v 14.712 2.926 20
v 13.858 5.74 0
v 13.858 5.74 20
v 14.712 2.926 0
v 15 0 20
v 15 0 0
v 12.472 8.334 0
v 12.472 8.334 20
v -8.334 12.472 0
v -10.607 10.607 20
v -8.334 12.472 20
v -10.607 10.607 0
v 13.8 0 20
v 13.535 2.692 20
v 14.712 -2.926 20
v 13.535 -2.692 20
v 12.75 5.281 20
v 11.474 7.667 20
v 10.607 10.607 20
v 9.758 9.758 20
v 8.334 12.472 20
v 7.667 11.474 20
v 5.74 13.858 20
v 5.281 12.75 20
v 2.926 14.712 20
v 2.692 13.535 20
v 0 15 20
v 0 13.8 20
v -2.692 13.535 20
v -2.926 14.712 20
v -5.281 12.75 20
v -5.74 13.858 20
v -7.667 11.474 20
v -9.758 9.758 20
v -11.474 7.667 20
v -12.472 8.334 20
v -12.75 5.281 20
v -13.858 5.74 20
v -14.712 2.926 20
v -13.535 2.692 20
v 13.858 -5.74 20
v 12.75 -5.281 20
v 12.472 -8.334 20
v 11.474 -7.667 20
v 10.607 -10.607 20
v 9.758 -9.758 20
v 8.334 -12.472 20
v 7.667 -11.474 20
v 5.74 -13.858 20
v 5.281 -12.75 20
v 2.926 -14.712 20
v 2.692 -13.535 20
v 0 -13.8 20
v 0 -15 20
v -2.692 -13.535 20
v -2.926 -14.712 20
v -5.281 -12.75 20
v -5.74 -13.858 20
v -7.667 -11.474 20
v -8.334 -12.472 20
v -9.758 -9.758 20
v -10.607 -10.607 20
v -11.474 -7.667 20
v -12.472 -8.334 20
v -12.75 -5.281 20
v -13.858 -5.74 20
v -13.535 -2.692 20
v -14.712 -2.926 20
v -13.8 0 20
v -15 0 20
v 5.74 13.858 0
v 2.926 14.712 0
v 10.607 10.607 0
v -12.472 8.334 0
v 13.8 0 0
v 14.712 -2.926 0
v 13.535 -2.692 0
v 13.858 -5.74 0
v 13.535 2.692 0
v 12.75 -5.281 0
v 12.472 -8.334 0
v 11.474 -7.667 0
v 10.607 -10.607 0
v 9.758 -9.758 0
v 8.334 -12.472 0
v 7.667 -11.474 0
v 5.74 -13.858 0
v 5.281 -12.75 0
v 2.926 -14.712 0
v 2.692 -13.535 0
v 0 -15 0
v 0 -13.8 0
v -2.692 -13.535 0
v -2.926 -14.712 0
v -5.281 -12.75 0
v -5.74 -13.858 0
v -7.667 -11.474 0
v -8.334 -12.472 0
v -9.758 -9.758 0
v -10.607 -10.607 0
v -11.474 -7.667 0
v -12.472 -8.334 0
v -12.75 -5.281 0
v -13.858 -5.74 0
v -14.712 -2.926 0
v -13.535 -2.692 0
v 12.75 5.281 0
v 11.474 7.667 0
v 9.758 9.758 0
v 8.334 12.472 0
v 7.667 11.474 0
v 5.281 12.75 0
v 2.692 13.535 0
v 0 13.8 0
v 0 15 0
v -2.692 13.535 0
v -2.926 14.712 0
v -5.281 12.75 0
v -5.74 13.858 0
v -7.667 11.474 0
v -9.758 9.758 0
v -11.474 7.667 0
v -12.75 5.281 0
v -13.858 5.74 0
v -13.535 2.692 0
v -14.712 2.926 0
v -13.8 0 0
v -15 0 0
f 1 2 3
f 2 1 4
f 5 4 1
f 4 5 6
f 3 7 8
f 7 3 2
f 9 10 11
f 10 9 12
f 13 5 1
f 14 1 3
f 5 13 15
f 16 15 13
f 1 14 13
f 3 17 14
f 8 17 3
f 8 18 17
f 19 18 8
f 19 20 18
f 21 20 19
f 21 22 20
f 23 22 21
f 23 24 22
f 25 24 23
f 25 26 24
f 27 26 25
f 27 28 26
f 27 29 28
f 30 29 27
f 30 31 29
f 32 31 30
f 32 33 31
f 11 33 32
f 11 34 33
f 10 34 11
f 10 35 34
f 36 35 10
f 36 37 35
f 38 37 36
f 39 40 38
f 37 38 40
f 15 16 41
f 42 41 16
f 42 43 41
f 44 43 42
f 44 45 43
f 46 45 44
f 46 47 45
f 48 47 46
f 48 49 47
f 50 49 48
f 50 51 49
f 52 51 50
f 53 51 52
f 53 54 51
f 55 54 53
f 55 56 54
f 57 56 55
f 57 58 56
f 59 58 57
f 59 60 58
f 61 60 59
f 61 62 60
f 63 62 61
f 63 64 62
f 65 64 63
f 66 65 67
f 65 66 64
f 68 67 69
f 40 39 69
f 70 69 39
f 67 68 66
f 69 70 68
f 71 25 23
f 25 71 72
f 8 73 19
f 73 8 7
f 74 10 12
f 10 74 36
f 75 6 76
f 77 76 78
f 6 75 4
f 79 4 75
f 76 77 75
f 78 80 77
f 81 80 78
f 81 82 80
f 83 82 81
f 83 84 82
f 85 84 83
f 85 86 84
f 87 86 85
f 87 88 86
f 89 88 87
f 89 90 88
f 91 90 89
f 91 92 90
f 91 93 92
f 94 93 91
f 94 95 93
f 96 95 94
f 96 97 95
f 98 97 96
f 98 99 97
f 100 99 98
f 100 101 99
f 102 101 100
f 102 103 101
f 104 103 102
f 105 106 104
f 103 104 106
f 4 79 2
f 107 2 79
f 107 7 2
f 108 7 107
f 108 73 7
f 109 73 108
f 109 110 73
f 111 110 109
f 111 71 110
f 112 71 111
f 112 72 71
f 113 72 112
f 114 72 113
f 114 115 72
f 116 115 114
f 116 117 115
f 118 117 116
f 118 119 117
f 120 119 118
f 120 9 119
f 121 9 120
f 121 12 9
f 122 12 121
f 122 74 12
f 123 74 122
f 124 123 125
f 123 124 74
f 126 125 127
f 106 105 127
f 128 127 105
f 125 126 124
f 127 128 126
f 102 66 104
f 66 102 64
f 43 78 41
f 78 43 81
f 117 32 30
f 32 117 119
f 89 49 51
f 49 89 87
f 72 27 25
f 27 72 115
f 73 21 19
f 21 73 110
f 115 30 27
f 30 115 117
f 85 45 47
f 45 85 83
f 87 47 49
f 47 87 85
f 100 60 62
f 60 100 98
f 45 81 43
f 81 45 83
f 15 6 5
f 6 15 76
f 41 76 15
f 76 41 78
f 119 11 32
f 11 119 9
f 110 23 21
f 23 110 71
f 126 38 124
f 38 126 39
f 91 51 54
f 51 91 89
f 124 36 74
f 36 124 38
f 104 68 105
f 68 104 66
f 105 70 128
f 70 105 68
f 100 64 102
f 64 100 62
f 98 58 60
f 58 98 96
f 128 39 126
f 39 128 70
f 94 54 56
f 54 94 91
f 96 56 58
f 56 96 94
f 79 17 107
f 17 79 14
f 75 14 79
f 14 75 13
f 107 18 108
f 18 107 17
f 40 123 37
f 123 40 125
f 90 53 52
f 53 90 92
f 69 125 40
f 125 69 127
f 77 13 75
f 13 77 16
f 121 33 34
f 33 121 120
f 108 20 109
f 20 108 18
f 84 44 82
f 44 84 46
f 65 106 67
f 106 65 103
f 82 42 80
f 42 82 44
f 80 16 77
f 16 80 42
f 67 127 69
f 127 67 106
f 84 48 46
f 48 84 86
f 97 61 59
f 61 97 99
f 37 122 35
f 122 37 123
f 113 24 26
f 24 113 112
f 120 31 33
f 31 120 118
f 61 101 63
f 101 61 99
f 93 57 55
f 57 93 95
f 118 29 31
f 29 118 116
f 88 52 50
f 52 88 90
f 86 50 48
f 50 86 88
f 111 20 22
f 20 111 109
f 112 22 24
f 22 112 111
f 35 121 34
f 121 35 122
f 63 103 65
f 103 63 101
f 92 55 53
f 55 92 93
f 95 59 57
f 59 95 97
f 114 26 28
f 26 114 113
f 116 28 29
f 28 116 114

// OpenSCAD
$fn = 32;

// ----------------------------------------------------------------------
// Thin tube: 1.2 mm wall
// ----------------------------------------------------------------------

// --- parameters (mm) ---
tube_od = 30;             // outer diameter
tube_h = 20;              // height, Z
wall = 1.2;               // wall thickness

difference() {
  cylinder(h = tube_h, d = tube_od);
  translate([0, 0, -1]) cylinder(h = tube_h + 2, d = tube_od - 2 * wall);
}
